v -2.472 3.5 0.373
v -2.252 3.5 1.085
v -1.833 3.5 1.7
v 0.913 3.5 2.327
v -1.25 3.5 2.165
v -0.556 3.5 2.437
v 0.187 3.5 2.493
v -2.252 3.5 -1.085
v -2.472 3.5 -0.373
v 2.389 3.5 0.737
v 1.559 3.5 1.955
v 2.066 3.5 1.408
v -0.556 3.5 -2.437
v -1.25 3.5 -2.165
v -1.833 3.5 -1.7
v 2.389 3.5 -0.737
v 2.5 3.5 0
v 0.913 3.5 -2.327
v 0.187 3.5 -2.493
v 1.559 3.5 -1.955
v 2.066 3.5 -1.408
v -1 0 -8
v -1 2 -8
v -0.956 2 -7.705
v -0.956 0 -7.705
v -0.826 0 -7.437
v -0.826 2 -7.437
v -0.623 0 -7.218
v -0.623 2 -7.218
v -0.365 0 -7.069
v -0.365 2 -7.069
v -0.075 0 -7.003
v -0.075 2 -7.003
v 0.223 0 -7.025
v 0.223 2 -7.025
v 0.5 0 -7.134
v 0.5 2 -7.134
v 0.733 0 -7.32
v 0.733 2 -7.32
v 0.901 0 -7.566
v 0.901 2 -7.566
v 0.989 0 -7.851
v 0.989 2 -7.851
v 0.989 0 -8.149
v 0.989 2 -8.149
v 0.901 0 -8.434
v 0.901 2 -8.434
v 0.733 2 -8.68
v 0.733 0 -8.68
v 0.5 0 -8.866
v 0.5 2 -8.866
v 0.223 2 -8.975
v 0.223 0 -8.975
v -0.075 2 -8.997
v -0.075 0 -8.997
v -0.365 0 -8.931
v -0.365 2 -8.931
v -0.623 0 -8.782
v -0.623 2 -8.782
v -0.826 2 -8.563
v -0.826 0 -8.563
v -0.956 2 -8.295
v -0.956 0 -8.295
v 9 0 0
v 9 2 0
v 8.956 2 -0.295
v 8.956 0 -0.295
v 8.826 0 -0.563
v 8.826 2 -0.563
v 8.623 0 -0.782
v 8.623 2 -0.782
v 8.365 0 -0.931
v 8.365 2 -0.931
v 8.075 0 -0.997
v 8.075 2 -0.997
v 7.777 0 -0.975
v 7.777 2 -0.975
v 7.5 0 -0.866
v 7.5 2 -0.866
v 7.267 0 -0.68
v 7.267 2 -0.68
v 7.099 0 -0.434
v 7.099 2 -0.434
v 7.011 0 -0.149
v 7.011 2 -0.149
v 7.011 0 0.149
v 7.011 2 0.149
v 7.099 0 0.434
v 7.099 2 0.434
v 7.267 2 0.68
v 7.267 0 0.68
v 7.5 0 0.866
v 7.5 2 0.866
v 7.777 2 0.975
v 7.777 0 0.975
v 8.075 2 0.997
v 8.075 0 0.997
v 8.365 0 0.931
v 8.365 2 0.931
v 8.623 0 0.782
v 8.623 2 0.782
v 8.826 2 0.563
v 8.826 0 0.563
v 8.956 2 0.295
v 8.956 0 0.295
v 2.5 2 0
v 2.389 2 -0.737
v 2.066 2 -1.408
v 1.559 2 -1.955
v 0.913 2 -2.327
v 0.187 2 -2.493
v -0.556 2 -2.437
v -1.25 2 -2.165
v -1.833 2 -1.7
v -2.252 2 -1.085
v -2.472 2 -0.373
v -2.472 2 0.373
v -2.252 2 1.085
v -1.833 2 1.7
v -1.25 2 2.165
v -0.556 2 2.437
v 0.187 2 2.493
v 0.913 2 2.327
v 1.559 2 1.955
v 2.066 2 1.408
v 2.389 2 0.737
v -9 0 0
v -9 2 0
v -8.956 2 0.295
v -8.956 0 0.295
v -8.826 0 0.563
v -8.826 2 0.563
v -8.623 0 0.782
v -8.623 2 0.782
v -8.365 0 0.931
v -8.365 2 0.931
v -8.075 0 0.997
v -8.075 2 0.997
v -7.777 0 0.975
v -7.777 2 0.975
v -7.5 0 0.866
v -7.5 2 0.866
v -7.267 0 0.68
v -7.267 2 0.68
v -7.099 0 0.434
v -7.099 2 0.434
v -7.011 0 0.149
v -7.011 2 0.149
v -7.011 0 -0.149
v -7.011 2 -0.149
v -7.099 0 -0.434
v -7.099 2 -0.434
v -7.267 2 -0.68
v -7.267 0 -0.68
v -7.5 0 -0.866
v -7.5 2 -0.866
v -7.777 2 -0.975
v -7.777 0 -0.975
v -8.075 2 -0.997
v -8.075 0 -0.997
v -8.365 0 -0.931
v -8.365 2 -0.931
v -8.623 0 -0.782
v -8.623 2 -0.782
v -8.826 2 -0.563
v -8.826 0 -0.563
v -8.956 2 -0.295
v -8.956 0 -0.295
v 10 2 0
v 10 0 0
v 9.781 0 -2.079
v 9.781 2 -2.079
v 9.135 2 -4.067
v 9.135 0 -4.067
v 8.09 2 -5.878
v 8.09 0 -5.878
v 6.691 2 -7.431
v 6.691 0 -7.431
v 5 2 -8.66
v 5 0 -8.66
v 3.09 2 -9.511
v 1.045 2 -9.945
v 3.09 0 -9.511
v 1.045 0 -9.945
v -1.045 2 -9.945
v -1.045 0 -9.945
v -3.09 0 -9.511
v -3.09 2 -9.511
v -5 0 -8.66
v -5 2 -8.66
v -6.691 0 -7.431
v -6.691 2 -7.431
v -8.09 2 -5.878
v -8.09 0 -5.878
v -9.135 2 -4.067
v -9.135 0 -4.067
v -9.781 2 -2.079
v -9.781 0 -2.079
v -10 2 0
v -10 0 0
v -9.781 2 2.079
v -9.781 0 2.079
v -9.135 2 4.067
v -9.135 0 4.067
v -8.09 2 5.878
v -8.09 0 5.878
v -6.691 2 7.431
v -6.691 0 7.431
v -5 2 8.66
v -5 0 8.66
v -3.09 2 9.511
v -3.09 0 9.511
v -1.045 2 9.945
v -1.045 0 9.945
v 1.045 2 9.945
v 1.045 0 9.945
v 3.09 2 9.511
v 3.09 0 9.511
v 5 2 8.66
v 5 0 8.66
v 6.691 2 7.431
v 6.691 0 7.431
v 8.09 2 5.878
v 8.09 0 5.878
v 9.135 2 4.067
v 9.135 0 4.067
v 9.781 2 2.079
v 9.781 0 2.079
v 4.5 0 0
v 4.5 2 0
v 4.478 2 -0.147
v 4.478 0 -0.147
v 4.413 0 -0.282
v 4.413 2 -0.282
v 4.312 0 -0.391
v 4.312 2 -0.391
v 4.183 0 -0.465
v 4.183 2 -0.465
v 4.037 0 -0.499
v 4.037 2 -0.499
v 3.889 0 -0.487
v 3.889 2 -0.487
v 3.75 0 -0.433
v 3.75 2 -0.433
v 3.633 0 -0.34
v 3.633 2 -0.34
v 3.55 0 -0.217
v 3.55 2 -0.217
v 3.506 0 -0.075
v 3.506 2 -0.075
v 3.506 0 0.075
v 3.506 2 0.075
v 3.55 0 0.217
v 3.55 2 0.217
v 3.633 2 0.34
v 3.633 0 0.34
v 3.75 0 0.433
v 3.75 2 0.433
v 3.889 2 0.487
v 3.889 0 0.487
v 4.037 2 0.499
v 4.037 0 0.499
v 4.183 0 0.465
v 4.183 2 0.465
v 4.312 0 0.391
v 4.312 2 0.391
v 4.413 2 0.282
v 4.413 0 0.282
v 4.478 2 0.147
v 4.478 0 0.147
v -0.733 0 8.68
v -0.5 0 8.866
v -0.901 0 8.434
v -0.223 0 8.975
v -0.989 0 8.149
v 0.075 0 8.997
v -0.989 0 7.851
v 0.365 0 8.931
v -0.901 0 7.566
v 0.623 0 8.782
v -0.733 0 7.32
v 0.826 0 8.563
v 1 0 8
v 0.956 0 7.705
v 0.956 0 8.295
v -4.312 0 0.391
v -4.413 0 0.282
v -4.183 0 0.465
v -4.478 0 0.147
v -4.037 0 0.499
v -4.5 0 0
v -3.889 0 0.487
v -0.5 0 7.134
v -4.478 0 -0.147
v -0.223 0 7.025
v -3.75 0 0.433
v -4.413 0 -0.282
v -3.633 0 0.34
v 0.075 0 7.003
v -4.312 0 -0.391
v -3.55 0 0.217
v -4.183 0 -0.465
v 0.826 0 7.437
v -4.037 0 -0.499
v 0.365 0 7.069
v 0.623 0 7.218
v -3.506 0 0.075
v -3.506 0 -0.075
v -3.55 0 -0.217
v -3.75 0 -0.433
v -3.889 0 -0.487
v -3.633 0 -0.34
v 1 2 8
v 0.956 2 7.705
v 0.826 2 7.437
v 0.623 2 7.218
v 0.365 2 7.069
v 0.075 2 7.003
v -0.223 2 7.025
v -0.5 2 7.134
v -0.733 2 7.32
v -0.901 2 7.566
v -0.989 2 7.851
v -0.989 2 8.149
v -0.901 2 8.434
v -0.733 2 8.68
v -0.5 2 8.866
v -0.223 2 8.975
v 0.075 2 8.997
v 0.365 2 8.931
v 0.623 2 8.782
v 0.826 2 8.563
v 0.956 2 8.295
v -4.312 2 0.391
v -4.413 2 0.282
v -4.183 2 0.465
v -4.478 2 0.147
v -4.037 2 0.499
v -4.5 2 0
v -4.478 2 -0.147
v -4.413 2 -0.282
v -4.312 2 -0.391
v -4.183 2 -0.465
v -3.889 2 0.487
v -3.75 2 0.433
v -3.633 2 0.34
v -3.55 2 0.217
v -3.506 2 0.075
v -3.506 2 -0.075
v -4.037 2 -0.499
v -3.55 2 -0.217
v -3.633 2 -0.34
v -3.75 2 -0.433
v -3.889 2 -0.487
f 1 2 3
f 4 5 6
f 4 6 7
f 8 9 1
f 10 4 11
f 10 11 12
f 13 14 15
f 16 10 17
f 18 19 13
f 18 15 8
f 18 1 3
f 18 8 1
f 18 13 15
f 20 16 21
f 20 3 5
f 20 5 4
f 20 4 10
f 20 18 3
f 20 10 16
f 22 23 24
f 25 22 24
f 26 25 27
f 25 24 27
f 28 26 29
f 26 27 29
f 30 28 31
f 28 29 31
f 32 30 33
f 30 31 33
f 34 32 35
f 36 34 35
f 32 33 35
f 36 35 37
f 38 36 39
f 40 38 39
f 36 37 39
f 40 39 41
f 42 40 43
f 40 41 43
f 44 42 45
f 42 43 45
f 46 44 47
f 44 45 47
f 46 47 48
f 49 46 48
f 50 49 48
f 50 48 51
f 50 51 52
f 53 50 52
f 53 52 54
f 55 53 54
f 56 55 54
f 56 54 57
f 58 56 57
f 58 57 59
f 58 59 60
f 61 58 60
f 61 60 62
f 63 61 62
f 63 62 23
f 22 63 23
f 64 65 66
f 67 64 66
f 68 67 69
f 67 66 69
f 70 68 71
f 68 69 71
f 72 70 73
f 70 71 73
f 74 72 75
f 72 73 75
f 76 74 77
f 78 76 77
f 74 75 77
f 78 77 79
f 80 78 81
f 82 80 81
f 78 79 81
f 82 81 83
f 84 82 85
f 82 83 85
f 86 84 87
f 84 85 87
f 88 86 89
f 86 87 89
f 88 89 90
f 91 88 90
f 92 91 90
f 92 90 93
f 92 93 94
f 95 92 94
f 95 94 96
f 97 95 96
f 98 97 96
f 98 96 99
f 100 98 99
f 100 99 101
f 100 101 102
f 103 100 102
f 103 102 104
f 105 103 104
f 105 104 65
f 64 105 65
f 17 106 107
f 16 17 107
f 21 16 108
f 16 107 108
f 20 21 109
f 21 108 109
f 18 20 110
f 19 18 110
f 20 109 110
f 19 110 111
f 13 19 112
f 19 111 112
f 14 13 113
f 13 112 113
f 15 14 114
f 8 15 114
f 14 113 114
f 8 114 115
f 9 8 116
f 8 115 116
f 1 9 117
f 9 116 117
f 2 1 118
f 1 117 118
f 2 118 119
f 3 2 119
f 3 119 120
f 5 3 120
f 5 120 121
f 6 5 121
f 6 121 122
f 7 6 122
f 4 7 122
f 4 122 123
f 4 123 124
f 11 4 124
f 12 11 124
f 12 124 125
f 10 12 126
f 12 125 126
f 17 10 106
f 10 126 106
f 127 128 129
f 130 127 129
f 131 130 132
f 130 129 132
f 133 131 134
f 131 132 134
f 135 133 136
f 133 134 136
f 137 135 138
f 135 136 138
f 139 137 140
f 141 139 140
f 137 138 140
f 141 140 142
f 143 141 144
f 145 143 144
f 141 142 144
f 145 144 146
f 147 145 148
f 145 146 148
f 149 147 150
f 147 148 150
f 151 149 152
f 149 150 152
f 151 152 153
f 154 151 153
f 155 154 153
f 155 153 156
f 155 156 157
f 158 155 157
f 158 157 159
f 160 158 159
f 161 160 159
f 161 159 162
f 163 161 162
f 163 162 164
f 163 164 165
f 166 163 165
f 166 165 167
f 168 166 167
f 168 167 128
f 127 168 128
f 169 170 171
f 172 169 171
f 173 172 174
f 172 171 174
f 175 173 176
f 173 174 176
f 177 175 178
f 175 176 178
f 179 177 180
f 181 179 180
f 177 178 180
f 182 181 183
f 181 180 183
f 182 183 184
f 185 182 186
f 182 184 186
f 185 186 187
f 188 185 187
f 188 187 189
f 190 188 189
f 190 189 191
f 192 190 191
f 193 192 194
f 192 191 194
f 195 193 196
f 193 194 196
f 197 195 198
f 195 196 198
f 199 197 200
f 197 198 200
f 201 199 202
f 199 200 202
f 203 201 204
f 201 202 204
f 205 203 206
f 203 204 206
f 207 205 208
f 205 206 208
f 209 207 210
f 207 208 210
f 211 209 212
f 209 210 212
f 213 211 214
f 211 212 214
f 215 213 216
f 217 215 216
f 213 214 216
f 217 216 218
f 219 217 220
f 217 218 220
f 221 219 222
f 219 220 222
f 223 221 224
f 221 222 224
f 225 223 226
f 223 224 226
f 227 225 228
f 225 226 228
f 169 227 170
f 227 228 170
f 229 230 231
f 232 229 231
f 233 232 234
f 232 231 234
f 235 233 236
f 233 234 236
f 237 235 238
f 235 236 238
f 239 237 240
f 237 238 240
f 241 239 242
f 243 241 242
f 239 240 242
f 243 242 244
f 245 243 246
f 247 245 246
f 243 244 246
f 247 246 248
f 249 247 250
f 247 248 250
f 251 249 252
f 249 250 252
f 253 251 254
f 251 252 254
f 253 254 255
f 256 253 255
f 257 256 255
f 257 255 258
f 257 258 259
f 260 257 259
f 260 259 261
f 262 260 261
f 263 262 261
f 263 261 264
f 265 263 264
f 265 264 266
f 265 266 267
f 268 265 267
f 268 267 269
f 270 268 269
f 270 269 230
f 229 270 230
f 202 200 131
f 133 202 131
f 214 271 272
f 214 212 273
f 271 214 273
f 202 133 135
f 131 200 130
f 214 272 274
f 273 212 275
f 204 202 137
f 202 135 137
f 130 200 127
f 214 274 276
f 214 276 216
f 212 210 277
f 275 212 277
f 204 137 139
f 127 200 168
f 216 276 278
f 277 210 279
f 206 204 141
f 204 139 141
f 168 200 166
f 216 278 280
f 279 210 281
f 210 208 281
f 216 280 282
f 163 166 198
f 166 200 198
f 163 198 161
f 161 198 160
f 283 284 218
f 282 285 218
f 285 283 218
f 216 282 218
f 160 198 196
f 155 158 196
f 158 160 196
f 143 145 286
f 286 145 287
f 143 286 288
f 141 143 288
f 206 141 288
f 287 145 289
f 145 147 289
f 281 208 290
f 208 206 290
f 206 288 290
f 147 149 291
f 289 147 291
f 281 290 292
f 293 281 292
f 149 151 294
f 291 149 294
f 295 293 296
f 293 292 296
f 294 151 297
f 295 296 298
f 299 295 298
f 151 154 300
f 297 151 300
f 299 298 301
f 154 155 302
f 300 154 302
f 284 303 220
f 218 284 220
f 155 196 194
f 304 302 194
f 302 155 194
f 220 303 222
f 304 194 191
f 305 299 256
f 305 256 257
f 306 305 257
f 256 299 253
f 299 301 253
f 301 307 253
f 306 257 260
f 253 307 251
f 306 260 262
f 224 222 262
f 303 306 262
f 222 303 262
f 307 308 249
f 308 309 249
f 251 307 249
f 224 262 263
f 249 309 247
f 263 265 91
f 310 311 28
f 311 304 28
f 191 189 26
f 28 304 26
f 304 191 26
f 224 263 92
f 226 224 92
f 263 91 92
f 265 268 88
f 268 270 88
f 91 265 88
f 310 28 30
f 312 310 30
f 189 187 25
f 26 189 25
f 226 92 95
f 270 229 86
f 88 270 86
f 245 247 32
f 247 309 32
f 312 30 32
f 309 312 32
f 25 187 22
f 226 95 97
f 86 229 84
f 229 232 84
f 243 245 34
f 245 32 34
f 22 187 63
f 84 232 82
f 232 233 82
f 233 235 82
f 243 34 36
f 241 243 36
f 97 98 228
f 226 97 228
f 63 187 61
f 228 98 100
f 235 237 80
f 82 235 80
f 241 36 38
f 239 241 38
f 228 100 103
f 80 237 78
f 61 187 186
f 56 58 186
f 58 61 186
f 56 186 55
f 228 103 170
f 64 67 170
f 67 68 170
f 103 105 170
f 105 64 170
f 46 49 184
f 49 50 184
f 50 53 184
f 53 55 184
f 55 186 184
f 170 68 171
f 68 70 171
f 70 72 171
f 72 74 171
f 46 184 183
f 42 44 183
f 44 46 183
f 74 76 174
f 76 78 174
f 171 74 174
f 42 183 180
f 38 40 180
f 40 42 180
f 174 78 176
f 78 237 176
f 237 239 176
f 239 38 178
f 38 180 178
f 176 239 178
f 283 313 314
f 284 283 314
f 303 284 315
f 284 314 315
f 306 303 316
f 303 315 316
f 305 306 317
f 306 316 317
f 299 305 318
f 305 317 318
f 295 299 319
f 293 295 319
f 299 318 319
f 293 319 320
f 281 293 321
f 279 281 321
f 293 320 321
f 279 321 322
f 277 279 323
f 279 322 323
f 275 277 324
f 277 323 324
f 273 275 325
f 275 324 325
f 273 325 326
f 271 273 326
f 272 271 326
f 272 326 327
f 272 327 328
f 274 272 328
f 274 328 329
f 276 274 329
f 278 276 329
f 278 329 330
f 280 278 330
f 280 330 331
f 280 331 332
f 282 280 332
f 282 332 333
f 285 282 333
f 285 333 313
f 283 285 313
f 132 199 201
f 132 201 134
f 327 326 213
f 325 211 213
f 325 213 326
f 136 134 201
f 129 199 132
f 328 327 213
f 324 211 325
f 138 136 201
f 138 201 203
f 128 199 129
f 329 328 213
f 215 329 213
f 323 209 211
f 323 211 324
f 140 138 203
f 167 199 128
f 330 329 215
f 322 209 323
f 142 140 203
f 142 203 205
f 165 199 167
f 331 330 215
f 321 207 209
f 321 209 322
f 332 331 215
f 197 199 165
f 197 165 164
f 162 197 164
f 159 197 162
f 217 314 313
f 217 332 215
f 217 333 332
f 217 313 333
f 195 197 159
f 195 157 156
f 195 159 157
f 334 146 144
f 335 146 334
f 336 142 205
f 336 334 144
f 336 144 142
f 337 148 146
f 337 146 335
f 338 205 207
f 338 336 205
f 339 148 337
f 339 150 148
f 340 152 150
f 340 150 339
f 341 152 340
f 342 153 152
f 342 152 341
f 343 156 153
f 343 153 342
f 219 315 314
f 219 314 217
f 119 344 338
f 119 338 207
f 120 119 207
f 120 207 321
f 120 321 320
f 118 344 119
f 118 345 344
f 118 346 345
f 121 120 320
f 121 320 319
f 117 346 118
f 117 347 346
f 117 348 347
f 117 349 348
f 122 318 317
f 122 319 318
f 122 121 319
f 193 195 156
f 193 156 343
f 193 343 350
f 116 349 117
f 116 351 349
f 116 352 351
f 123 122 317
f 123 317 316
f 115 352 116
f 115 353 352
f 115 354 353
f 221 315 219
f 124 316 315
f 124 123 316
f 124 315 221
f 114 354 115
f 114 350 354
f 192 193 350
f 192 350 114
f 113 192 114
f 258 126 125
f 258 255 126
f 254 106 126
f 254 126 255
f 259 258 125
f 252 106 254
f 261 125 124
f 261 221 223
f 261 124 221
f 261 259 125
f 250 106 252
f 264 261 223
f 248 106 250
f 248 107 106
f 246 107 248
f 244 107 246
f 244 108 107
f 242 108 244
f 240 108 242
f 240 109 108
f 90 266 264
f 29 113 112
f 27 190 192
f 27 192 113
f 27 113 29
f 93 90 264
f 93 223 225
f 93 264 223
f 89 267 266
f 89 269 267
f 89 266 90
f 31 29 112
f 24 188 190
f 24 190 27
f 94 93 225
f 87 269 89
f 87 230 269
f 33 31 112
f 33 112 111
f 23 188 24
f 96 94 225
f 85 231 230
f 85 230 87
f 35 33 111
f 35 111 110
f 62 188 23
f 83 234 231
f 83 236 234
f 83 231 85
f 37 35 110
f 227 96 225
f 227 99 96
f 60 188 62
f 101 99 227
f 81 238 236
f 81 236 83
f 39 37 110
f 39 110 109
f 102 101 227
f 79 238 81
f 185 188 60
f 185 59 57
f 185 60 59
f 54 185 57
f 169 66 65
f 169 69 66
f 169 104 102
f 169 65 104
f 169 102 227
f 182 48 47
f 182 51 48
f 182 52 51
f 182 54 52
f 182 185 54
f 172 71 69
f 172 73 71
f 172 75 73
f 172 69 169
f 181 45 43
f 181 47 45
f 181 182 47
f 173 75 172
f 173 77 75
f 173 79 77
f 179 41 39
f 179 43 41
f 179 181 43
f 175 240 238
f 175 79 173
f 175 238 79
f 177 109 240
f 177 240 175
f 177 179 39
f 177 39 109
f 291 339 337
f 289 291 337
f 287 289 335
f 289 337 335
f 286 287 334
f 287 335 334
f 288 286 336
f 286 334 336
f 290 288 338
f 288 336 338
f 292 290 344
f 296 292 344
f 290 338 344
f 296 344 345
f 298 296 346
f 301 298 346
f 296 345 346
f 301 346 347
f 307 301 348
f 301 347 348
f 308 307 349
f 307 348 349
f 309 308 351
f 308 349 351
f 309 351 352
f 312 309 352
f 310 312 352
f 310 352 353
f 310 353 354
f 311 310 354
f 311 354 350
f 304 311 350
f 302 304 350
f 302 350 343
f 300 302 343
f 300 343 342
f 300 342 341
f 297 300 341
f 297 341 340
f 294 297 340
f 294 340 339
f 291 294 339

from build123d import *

# Parameters (mm, degrees)
REVOLVE_1_OUTLINE_R   = 10
REVOLVE_1_DEPTH       = 2
REVOLVE_START         = 2
REVOLVE_1_2_OUTLINE_R = 2.5
REVOLVE_1_2_DEPTH     = 1.5
SKETCH_2_R            = 1
SKETCH_2_R_2          = 0.5
CUT_EXTRUDE_2_DEPTH   = 15.282856857


# Read off the part's stored shape, not the designer's step: 旋转1
with BuildPart() as part:
    # 旋转1 outline → 旋转1 (new body)
    with BuildSketch(Plane(origin=(0, 0, 0), x_dir=(1, 0, 0), z_dir=(0, 1, 0))):
        Circle(REVOLVE_1_OUTLINE_R)
    extrude(amount=REVOLVE_1_DEPTH)

    # Revolve 1 2 outline → Revolve 1 2 (add)
    with BuildSketch(Plane(origin=(0, 0, 0), x_dir=(1, 0, 0), z_dir=(0, 1, 0)).offset(REVOLVE_START)):
        Circle(REVOLVE_1_2_OUTLINE_R)
    extrude(amount=REVOLVE_1_2_DEPTH)

    # 草图2 → 切除-拉伸2 (cut, through all)
    with BuildSketch(Plane(origin=(0, 2, 0), x_dir=(1, 0, 0), z_dir=(0, 1, 0))):
        with Locations(Location((-8, 0, 0), (0, 0, 180))):
            Circle(SKETCH_2_R)
        with Locations((4, 0)):
            Circle(SKETCH_2_R_2)
        with Locations((8, 0)):
            Circle(SKETCH_2_R)
        with Locations(Location((-4, 0, 0), (0, 0, 180))):
            Circle(SKETCH_2_R_2)
        with Locations(Location((0, 8, 0), (0, 0, 180))):
            Circle(SKETCH_2_R)
        with Locations((0, -8)):
            Circle(SKETCH_2_R)
    extrude(amount=-CUT_EXTRUDE_2_DEPTH, mode=Mode.SUBTRACT)


solid = part.part
